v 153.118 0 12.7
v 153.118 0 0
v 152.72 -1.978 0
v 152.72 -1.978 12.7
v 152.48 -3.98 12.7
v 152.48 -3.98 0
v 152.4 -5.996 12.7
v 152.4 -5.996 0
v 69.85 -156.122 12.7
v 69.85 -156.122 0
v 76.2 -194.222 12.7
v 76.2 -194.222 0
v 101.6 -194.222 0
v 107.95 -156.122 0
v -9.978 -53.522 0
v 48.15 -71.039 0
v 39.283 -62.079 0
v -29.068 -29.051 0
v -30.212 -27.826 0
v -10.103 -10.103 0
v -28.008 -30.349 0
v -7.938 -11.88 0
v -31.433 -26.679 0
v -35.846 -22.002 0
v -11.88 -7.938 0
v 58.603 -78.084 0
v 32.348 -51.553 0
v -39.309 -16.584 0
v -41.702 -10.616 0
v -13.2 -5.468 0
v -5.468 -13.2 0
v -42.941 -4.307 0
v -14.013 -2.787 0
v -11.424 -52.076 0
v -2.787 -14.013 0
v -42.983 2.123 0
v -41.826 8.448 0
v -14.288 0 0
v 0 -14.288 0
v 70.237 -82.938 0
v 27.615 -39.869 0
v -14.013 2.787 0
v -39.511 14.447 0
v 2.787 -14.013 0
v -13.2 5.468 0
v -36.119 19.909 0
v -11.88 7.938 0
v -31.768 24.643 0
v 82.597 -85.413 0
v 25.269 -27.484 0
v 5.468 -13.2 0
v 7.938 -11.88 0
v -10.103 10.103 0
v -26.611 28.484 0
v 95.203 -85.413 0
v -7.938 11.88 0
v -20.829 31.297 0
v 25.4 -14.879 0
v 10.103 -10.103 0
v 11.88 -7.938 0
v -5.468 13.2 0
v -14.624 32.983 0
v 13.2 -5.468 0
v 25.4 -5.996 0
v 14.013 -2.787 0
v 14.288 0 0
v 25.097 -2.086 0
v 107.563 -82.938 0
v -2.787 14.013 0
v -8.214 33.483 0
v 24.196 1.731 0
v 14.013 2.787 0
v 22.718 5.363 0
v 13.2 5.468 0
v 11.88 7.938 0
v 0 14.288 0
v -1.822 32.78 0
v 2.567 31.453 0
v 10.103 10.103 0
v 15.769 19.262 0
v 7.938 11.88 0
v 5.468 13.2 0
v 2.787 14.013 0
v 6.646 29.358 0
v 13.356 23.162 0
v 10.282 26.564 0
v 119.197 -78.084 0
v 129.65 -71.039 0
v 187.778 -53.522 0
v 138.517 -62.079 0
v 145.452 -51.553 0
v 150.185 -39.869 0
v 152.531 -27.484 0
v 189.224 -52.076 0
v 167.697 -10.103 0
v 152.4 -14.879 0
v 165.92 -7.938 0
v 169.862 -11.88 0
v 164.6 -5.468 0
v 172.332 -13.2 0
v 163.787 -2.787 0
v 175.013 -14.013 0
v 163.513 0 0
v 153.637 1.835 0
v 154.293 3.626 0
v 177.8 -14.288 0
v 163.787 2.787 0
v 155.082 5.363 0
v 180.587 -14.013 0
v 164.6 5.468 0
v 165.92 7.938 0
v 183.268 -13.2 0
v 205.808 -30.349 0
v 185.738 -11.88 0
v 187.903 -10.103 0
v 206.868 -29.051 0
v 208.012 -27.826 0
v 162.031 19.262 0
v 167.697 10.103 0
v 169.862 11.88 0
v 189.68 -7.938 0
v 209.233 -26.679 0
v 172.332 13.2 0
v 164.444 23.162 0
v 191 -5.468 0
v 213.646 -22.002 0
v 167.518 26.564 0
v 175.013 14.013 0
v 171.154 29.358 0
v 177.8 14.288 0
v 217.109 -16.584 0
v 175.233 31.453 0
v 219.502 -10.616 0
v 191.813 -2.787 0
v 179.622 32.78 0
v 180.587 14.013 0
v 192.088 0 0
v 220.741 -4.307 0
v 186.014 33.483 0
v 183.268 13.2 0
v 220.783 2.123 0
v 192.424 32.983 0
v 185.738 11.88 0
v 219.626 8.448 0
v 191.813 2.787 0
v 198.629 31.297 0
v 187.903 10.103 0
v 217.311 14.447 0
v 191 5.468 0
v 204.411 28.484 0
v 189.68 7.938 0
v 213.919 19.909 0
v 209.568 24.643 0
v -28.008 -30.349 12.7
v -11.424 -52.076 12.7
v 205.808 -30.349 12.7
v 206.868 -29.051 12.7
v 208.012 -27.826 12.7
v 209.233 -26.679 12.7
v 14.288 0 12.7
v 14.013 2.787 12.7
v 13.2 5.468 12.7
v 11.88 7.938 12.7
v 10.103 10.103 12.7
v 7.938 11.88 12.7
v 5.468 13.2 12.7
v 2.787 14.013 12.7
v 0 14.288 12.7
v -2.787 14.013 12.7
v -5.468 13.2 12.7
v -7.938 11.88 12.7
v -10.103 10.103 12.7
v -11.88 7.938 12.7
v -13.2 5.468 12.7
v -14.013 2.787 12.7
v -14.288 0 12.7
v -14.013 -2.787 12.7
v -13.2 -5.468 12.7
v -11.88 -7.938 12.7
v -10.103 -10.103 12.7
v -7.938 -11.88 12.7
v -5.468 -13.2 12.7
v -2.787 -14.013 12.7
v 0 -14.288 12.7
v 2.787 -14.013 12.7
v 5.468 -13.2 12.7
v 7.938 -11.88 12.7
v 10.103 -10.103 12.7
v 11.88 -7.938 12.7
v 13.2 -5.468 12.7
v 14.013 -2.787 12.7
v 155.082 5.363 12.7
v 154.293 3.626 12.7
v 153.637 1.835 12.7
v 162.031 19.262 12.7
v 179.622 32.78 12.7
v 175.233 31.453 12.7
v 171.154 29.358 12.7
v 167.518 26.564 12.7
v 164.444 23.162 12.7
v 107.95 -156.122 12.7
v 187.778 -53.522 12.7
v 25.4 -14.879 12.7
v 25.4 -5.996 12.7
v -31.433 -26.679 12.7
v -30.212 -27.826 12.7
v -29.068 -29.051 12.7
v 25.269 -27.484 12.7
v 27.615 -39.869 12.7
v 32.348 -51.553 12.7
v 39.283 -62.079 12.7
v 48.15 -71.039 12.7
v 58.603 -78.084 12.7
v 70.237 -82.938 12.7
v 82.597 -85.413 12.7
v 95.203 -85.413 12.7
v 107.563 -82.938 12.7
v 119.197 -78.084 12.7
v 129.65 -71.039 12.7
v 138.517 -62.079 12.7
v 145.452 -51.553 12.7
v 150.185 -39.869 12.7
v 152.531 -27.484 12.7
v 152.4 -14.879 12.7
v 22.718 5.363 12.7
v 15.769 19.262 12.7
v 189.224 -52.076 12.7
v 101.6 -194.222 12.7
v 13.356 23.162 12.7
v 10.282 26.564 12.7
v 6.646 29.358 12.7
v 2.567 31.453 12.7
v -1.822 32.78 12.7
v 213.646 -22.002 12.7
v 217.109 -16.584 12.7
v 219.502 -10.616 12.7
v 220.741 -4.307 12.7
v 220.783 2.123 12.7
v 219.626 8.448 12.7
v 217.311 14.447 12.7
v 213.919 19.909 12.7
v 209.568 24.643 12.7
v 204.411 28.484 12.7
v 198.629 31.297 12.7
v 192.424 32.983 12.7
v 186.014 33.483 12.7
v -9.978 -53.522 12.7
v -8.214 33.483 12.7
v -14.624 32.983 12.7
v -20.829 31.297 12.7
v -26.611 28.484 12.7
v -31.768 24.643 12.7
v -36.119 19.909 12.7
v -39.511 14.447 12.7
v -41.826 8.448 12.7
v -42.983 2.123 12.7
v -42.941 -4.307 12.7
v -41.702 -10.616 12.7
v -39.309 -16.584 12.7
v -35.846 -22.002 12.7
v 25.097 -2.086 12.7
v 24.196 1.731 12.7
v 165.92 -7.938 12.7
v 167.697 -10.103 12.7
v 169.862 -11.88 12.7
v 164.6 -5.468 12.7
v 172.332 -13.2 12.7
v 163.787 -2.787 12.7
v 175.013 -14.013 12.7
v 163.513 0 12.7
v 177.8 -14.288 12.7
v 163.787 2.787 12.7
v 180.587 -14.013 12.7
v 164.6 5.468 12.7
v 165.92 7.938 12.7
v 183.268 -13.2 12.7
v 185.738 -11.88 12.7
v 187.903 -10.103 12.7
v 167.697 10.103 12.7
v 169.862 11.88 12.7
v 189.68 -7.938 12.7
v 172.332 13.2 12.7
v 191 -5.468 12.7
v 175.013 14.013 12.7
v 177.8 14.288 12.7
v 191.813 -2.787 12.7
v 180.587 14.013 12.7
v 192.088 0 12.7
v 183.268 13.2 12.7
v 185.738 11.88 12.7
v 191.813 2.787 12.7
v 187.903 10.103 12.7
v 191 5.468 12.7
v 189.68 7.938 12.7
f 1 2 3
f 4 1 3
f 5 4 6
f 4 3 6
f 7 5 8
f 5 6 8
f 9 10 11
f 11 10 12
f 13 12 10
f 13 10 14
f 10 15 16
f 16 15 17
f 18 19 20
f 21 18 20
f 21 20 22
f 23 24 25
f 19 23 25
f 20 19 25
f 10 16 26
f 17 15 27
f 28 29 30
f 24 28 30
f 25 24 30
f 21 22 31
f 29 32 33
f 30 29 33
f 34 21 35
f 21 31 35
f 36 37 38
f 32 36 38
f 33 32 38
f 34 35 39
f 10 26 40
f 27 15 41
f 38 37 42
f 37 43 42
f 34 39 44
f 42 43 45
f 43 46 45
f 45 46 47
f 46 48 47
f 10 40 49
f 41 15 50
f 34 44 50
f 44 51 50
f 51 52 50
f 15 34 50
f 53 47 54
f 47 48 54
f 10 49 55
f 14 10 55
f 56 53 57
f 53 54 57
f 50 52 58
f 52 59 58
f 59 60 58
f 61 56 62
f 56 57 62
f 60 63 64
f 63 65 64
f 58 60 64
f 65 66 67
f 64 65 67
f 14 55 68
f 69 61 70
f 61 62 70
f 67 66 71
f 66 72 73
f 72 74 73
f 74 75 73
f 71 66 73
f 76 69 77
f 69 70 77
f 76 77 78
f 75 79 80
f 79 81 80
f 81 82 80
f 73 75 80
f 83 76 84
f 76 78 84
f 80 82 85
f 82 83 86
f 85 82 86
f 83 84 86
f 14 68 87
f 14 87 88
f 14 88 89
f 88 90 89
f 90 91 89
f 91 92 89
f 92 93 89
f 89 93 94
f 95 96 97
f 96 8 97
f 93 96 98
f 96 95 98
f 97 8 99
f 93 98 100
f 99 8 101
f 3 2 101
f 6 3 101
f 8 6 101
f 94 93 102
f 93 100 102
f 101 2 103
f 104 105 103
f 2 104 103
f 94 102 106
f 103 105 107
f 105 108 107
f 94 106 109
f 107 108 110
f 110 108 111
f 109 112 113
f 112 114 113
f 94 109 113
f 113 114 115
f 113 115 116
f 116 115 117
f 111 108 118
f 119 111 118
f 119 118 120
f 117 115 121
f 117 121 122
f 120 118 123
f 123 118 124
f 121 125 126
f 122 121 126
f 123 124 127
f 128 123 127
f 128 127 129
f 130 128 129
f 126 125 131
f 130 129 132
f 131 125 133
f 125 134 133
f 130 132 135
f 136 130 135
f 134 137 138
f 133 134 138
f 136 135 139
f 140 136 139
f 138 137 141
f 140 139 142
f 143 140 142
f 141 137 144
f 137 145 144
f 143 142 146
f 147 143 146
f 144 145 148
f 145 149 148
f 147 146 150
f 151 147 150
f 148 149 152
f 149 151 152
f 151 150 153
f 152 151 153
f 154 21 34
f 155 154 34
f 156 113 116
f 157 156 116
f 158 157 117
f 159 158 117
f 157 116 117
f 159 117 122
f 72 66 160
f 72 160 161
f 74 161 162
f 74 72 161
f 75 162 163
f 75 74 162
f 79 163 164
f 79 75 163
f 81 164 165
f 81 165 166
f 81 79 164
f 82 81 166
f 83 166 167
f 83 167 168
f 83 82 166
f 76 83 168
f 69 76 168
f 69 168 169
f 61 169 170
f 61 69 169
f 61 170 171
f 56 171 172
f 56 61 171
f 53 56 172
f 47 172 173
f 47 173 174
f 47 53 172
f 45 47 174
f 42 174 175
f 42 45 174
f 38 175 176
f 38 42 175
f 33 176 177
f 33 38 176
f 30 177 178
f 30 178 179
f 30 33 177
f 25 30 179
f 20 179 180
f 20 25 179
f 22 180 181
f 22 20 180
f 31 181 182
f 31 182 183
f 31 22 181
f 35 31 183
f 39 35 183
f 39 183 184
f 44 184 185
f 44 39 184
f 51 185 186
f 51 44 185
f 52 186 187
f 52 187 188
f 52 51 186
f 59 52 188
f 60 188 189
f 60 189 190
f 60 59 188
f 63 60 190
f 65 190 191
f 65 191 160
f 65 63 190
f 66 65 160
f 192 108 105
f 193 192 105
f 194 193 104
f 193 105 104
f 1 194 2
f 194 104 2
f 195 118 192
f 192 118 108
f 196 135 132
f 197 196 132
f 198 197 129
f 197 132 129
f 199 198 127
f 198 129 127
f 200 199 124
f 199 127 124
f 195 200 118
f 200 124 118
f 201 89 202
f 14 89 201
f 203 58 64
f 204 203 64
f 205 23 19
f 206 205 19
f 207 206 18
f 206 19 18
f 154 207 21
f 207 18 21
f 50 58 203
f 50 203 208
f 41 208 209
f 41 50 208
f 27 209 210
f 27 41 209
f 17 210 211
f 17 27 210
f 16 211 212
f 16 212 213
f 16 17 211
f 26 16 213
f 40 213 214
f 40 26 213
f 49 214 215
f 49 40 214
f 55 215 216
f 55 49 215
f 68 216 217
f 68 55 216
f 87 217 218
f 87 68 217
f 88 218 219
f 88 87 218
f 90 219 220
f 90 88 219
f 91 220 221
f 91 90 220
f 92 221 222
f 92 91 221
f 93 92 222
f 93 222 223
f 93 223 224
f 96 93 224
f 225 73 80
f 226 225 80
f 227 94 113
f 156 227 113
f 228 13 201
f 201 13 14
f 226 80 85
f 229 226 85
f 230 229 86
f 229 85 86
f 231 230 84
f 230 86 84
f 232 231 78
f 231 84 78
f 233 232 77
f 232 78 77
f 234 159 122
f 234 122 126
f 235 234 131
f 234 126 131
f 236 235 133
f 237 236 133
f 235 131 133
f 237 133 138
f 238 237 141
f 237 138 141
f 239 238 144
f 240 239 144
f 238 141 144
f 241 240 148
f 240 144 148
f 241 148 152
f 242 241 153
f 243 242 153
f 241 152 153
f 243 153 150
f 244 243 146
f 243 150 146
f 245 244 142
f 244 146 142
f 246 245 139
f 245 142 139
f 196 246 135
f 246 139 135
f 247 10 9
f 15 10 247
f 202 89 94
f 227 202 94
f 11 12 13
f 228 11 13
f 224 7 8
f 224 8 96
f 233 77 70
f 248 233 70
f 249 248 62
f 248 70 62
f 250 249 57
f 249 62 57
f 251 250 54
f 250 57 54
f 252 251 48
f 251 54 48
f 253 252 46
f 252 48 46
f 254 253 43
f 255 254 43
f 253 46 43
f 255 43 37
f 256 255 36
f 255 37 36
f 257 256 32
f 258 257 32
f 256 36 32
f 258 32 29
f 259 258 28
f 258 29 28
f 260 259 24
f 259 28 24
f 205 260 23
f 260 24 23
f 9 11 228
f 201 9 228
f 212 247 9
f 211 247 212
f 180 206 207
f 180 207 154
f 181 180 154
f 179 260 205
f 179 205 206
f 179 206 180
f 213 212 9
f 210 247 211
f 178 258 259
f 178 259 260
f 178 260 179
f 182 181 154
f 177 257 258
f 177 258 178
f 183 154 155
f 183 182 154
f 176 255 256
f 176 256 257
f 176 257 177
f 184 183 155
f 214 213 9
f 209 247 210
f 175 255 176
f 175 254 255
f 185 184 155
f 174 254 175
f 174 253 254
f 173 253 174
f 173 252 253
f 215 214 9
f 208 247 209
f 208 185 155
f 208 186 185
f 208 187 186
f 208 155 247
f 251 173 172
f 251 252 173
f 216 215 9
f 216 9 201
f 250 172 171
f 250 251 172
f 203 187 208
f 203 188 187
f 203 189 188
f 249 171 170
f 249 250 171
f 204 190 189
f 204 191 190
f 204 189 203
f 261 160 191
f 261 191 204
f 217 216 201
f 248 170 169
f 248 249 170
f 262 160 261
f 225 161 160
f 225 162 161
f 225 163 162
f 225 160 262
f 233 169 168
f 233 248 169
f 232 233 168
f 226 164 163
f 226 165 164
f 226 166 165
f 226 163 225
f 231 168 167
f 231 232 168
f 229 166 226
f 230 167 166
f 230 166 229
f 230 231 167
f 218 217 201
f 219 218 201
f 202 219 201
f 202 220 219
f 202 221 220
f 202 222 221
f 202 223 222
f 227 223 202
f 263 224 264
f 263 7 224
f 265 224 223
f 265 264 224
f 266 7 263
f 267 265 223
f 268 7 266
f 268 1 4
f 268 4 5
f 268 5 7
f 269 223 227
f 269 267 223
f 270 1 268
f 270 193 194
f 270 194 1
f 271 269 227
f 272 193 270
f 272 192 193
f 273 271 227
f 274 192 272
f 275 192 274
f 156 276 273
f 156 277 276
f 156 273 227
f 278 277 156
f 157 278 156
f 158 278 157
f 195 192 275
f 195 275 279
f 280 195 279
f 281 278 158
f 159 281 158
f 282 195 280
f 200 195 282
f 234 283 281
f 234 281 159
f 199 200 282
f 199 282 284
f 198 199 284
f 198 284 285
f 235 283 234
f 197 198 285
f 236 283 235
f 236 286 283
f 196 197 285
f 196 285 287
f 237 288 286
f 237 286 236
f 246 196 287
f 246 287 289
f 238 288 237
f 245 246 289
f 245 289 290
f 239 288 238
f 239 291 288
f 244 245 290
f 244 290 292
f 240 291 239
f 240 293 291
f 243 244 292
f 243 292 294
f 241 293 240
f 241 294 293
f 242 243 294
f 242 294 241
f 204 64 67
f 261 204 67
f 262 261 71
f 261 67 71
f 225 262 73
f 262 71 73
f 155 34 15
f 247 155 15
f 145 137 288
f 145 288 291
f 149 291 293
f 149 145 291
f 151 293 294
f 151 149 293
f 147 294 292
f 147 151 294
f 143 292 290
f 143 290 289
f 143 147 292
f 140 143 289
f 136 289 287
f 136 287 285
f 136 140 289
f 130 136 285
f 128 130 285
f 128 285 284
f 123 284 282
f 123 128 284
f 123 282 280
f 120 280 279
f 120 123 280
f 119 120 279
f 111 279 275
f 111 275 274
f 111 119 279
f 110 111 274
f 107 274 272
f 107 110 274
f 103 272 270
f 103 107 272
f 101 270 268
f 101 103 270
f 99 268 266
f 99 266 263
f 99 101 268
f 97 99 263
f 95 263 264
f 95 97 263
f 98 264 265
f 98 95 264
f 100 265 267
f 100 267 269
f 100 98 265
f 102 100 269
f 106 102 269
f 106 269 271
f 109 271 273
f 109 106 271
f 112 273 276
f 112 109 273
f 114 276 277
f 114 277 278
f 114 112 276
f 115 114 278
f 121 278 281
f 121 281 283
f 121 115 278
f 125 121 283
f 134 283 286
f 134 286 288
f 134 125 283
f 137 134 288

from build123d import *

# Parameters (mm, degrees)
SKETCH1_R           = 14.2875
BOSS_EXTRUDE1_DEPTH = 12.7
CUT_EXTRUDE1_REACH  = 296.425
BOSS_EXTRUDE2_DEPTH = 12.7


with BuildPart() as part:
    # Sketch1 → Boss-Extrude1 (new body)
    with BuildSketch(Plane.XY):
        with BuildLine():
            ThreePointArc((15.768991732, 19.262016535), (8.527285023, 28.043059255), (-1.822173444, 32.779908077))
            ThreePointArc((-1.822173444, 32.779908077), (-39.510935789, 14.446614644), (-31.433481123, -26.678890597))
            ThreePointArc((-31.433481123, -26.678890597), (-29.629692736, -28.429204591), (-28.007722741, -30.349221507))
            Line((-28.007722741, -30.349221507), (-11.423585695, -52.076414305))
            Line((-11.423585695, -52.076414305), (25.4, -88.9))
            Line((25.4, -88.9), (69.85, -156.121724899))
            Line((69.85, -156.121724899), (76.2, -194.221724899))
            Line((76.2, -194.221724899), (101.6, -194.221724899))
            Line((101.6, -194.221724899), (107.95, -156.121724899))
            Line((107.95, -156.121724899), (152.4, -88.9))
            Line((152.4, -88.9), (189.223585695, -52.076414305))
            Line((189.223585695, -52.076414305), (205.807722741, -30.349221507))
            ThreePointArc((205.807722741, -30.349221507), (207.429692736, -28.429204591), (209.233481123, -26.678890597))
            ThreePointArc((209.233481123, -26.678890597), (217.310935789, 14.446614644), (179.622173444, 32.779908077))
            ThreePointArc((179.622173444, 32.779908077), (169.272714977, 28.043059255), (162.031008268, 19.262016535))
            Line((162.031008268, 19.262016535), (155.081549349, 5.363098697))
            ThreePointArc((155.081549349, 5.363098697), (153.948502104, 2.736916834), (153.117891795, 0))
            ThreePointArc((153.117891795, 0), (152.580111535, -2.976652205), (152.4, -5.996126628))
            Line((152.4, -5.996126628), (152.4, -14.878975516))
            ThreePointArc((152.4, -14.878975516), (150.466540126, -24.599134698), (144.960512242, -32.839487758))
            Line((144.960512242, -32.839487758), (106.860512242, -70.939487758))
            ThreePointArc((106.860512242, -70.939487758), (88.9, -78.378975516), (70.939487758, -70.939487758))
            Line((70.939487758, -70.939487758), (32.839487758, -32.839487758))
            ThreePointArc((32.839487758, -32.839487758), (27.333459874, -24.599134698), (25.4, -14.878975516))
            Line((25.4, -14.878975516), (25.4, -5.996126628))
            ThreePointArc((25.4, -5.996126628), (24.720524332, -0.160402447), (22.718450651, 5.363098697))
            Line((22.718450651, 5.363098697), (15.768991732, 19.262016535))
        make_face()
        Circle(SKETCH1_R, mode=Mode.SUBTRACT)
        with Locations((177.8, 0)):
            Circle(SKETCH1_R, mode=Mode.SUBTRACT)
    extrude(amount=BOSS_EXTRUDE1_DEPTH)

    # Sketch2 → Cut-Extrude1 (cut, up to next)
    with BuildSketch(Plane(origin=(0, 0, 0), x_dir=(-1, 0, 0), z_dir=(0, 0, -1)), mode=Mode.PRIVATE) as cut_extrude1_sk1:
        with BuildLine():
            Line((-152.4, -14.878975516), (-25.4, -14.878975516))
            ThreePointArc((-25.4, -14.878975516), (-88.9, -85.725), (-152.4, -14.878975516))
        make_face()
    cut_extrude1_tool1 = extrude(cut_extrude1_sk1.sketch, amount=-CUT_EXTRUDE1_REACH, mode=Mode.PRIVATE) & part.part
    add(cut_extrude1_tool1.solids().sort_by_distance((88.9, -45.233395, 0))[0], mode=Mode.SUBTRACT)

    # Sketch3 → Boss-Extrude2 (add, through all)
    with BuildSketch(Plane(origin=(0, 0, 0), x_dir=(-1, 0, 0), z_dir=(0, 0, -1))):
        with BuildLine():
            Line((-205.807722741, -30.349221507), (-107.95, -156.121724899))
            Line((-107.95, -156.121724899), (-69.85, -156.121724899))
            Line((-69.85, -156.121724899), (28.007722741, -30.349221507))
            Line((28.007722741, -30.349221507), (-25.01914535, -21.84414535))
            ThreePointArc((-25.01914535, -21.84414535), (-88.9, -85.725), (-152.78085465, -21.84414535))
            Line((-152.78085465, -21.84414535), (-205.807722741, -30.349221507))
        make_face()
    extrude(amount=-BOSS_EXTRUDE2_DEPTH)


solid = part.part
